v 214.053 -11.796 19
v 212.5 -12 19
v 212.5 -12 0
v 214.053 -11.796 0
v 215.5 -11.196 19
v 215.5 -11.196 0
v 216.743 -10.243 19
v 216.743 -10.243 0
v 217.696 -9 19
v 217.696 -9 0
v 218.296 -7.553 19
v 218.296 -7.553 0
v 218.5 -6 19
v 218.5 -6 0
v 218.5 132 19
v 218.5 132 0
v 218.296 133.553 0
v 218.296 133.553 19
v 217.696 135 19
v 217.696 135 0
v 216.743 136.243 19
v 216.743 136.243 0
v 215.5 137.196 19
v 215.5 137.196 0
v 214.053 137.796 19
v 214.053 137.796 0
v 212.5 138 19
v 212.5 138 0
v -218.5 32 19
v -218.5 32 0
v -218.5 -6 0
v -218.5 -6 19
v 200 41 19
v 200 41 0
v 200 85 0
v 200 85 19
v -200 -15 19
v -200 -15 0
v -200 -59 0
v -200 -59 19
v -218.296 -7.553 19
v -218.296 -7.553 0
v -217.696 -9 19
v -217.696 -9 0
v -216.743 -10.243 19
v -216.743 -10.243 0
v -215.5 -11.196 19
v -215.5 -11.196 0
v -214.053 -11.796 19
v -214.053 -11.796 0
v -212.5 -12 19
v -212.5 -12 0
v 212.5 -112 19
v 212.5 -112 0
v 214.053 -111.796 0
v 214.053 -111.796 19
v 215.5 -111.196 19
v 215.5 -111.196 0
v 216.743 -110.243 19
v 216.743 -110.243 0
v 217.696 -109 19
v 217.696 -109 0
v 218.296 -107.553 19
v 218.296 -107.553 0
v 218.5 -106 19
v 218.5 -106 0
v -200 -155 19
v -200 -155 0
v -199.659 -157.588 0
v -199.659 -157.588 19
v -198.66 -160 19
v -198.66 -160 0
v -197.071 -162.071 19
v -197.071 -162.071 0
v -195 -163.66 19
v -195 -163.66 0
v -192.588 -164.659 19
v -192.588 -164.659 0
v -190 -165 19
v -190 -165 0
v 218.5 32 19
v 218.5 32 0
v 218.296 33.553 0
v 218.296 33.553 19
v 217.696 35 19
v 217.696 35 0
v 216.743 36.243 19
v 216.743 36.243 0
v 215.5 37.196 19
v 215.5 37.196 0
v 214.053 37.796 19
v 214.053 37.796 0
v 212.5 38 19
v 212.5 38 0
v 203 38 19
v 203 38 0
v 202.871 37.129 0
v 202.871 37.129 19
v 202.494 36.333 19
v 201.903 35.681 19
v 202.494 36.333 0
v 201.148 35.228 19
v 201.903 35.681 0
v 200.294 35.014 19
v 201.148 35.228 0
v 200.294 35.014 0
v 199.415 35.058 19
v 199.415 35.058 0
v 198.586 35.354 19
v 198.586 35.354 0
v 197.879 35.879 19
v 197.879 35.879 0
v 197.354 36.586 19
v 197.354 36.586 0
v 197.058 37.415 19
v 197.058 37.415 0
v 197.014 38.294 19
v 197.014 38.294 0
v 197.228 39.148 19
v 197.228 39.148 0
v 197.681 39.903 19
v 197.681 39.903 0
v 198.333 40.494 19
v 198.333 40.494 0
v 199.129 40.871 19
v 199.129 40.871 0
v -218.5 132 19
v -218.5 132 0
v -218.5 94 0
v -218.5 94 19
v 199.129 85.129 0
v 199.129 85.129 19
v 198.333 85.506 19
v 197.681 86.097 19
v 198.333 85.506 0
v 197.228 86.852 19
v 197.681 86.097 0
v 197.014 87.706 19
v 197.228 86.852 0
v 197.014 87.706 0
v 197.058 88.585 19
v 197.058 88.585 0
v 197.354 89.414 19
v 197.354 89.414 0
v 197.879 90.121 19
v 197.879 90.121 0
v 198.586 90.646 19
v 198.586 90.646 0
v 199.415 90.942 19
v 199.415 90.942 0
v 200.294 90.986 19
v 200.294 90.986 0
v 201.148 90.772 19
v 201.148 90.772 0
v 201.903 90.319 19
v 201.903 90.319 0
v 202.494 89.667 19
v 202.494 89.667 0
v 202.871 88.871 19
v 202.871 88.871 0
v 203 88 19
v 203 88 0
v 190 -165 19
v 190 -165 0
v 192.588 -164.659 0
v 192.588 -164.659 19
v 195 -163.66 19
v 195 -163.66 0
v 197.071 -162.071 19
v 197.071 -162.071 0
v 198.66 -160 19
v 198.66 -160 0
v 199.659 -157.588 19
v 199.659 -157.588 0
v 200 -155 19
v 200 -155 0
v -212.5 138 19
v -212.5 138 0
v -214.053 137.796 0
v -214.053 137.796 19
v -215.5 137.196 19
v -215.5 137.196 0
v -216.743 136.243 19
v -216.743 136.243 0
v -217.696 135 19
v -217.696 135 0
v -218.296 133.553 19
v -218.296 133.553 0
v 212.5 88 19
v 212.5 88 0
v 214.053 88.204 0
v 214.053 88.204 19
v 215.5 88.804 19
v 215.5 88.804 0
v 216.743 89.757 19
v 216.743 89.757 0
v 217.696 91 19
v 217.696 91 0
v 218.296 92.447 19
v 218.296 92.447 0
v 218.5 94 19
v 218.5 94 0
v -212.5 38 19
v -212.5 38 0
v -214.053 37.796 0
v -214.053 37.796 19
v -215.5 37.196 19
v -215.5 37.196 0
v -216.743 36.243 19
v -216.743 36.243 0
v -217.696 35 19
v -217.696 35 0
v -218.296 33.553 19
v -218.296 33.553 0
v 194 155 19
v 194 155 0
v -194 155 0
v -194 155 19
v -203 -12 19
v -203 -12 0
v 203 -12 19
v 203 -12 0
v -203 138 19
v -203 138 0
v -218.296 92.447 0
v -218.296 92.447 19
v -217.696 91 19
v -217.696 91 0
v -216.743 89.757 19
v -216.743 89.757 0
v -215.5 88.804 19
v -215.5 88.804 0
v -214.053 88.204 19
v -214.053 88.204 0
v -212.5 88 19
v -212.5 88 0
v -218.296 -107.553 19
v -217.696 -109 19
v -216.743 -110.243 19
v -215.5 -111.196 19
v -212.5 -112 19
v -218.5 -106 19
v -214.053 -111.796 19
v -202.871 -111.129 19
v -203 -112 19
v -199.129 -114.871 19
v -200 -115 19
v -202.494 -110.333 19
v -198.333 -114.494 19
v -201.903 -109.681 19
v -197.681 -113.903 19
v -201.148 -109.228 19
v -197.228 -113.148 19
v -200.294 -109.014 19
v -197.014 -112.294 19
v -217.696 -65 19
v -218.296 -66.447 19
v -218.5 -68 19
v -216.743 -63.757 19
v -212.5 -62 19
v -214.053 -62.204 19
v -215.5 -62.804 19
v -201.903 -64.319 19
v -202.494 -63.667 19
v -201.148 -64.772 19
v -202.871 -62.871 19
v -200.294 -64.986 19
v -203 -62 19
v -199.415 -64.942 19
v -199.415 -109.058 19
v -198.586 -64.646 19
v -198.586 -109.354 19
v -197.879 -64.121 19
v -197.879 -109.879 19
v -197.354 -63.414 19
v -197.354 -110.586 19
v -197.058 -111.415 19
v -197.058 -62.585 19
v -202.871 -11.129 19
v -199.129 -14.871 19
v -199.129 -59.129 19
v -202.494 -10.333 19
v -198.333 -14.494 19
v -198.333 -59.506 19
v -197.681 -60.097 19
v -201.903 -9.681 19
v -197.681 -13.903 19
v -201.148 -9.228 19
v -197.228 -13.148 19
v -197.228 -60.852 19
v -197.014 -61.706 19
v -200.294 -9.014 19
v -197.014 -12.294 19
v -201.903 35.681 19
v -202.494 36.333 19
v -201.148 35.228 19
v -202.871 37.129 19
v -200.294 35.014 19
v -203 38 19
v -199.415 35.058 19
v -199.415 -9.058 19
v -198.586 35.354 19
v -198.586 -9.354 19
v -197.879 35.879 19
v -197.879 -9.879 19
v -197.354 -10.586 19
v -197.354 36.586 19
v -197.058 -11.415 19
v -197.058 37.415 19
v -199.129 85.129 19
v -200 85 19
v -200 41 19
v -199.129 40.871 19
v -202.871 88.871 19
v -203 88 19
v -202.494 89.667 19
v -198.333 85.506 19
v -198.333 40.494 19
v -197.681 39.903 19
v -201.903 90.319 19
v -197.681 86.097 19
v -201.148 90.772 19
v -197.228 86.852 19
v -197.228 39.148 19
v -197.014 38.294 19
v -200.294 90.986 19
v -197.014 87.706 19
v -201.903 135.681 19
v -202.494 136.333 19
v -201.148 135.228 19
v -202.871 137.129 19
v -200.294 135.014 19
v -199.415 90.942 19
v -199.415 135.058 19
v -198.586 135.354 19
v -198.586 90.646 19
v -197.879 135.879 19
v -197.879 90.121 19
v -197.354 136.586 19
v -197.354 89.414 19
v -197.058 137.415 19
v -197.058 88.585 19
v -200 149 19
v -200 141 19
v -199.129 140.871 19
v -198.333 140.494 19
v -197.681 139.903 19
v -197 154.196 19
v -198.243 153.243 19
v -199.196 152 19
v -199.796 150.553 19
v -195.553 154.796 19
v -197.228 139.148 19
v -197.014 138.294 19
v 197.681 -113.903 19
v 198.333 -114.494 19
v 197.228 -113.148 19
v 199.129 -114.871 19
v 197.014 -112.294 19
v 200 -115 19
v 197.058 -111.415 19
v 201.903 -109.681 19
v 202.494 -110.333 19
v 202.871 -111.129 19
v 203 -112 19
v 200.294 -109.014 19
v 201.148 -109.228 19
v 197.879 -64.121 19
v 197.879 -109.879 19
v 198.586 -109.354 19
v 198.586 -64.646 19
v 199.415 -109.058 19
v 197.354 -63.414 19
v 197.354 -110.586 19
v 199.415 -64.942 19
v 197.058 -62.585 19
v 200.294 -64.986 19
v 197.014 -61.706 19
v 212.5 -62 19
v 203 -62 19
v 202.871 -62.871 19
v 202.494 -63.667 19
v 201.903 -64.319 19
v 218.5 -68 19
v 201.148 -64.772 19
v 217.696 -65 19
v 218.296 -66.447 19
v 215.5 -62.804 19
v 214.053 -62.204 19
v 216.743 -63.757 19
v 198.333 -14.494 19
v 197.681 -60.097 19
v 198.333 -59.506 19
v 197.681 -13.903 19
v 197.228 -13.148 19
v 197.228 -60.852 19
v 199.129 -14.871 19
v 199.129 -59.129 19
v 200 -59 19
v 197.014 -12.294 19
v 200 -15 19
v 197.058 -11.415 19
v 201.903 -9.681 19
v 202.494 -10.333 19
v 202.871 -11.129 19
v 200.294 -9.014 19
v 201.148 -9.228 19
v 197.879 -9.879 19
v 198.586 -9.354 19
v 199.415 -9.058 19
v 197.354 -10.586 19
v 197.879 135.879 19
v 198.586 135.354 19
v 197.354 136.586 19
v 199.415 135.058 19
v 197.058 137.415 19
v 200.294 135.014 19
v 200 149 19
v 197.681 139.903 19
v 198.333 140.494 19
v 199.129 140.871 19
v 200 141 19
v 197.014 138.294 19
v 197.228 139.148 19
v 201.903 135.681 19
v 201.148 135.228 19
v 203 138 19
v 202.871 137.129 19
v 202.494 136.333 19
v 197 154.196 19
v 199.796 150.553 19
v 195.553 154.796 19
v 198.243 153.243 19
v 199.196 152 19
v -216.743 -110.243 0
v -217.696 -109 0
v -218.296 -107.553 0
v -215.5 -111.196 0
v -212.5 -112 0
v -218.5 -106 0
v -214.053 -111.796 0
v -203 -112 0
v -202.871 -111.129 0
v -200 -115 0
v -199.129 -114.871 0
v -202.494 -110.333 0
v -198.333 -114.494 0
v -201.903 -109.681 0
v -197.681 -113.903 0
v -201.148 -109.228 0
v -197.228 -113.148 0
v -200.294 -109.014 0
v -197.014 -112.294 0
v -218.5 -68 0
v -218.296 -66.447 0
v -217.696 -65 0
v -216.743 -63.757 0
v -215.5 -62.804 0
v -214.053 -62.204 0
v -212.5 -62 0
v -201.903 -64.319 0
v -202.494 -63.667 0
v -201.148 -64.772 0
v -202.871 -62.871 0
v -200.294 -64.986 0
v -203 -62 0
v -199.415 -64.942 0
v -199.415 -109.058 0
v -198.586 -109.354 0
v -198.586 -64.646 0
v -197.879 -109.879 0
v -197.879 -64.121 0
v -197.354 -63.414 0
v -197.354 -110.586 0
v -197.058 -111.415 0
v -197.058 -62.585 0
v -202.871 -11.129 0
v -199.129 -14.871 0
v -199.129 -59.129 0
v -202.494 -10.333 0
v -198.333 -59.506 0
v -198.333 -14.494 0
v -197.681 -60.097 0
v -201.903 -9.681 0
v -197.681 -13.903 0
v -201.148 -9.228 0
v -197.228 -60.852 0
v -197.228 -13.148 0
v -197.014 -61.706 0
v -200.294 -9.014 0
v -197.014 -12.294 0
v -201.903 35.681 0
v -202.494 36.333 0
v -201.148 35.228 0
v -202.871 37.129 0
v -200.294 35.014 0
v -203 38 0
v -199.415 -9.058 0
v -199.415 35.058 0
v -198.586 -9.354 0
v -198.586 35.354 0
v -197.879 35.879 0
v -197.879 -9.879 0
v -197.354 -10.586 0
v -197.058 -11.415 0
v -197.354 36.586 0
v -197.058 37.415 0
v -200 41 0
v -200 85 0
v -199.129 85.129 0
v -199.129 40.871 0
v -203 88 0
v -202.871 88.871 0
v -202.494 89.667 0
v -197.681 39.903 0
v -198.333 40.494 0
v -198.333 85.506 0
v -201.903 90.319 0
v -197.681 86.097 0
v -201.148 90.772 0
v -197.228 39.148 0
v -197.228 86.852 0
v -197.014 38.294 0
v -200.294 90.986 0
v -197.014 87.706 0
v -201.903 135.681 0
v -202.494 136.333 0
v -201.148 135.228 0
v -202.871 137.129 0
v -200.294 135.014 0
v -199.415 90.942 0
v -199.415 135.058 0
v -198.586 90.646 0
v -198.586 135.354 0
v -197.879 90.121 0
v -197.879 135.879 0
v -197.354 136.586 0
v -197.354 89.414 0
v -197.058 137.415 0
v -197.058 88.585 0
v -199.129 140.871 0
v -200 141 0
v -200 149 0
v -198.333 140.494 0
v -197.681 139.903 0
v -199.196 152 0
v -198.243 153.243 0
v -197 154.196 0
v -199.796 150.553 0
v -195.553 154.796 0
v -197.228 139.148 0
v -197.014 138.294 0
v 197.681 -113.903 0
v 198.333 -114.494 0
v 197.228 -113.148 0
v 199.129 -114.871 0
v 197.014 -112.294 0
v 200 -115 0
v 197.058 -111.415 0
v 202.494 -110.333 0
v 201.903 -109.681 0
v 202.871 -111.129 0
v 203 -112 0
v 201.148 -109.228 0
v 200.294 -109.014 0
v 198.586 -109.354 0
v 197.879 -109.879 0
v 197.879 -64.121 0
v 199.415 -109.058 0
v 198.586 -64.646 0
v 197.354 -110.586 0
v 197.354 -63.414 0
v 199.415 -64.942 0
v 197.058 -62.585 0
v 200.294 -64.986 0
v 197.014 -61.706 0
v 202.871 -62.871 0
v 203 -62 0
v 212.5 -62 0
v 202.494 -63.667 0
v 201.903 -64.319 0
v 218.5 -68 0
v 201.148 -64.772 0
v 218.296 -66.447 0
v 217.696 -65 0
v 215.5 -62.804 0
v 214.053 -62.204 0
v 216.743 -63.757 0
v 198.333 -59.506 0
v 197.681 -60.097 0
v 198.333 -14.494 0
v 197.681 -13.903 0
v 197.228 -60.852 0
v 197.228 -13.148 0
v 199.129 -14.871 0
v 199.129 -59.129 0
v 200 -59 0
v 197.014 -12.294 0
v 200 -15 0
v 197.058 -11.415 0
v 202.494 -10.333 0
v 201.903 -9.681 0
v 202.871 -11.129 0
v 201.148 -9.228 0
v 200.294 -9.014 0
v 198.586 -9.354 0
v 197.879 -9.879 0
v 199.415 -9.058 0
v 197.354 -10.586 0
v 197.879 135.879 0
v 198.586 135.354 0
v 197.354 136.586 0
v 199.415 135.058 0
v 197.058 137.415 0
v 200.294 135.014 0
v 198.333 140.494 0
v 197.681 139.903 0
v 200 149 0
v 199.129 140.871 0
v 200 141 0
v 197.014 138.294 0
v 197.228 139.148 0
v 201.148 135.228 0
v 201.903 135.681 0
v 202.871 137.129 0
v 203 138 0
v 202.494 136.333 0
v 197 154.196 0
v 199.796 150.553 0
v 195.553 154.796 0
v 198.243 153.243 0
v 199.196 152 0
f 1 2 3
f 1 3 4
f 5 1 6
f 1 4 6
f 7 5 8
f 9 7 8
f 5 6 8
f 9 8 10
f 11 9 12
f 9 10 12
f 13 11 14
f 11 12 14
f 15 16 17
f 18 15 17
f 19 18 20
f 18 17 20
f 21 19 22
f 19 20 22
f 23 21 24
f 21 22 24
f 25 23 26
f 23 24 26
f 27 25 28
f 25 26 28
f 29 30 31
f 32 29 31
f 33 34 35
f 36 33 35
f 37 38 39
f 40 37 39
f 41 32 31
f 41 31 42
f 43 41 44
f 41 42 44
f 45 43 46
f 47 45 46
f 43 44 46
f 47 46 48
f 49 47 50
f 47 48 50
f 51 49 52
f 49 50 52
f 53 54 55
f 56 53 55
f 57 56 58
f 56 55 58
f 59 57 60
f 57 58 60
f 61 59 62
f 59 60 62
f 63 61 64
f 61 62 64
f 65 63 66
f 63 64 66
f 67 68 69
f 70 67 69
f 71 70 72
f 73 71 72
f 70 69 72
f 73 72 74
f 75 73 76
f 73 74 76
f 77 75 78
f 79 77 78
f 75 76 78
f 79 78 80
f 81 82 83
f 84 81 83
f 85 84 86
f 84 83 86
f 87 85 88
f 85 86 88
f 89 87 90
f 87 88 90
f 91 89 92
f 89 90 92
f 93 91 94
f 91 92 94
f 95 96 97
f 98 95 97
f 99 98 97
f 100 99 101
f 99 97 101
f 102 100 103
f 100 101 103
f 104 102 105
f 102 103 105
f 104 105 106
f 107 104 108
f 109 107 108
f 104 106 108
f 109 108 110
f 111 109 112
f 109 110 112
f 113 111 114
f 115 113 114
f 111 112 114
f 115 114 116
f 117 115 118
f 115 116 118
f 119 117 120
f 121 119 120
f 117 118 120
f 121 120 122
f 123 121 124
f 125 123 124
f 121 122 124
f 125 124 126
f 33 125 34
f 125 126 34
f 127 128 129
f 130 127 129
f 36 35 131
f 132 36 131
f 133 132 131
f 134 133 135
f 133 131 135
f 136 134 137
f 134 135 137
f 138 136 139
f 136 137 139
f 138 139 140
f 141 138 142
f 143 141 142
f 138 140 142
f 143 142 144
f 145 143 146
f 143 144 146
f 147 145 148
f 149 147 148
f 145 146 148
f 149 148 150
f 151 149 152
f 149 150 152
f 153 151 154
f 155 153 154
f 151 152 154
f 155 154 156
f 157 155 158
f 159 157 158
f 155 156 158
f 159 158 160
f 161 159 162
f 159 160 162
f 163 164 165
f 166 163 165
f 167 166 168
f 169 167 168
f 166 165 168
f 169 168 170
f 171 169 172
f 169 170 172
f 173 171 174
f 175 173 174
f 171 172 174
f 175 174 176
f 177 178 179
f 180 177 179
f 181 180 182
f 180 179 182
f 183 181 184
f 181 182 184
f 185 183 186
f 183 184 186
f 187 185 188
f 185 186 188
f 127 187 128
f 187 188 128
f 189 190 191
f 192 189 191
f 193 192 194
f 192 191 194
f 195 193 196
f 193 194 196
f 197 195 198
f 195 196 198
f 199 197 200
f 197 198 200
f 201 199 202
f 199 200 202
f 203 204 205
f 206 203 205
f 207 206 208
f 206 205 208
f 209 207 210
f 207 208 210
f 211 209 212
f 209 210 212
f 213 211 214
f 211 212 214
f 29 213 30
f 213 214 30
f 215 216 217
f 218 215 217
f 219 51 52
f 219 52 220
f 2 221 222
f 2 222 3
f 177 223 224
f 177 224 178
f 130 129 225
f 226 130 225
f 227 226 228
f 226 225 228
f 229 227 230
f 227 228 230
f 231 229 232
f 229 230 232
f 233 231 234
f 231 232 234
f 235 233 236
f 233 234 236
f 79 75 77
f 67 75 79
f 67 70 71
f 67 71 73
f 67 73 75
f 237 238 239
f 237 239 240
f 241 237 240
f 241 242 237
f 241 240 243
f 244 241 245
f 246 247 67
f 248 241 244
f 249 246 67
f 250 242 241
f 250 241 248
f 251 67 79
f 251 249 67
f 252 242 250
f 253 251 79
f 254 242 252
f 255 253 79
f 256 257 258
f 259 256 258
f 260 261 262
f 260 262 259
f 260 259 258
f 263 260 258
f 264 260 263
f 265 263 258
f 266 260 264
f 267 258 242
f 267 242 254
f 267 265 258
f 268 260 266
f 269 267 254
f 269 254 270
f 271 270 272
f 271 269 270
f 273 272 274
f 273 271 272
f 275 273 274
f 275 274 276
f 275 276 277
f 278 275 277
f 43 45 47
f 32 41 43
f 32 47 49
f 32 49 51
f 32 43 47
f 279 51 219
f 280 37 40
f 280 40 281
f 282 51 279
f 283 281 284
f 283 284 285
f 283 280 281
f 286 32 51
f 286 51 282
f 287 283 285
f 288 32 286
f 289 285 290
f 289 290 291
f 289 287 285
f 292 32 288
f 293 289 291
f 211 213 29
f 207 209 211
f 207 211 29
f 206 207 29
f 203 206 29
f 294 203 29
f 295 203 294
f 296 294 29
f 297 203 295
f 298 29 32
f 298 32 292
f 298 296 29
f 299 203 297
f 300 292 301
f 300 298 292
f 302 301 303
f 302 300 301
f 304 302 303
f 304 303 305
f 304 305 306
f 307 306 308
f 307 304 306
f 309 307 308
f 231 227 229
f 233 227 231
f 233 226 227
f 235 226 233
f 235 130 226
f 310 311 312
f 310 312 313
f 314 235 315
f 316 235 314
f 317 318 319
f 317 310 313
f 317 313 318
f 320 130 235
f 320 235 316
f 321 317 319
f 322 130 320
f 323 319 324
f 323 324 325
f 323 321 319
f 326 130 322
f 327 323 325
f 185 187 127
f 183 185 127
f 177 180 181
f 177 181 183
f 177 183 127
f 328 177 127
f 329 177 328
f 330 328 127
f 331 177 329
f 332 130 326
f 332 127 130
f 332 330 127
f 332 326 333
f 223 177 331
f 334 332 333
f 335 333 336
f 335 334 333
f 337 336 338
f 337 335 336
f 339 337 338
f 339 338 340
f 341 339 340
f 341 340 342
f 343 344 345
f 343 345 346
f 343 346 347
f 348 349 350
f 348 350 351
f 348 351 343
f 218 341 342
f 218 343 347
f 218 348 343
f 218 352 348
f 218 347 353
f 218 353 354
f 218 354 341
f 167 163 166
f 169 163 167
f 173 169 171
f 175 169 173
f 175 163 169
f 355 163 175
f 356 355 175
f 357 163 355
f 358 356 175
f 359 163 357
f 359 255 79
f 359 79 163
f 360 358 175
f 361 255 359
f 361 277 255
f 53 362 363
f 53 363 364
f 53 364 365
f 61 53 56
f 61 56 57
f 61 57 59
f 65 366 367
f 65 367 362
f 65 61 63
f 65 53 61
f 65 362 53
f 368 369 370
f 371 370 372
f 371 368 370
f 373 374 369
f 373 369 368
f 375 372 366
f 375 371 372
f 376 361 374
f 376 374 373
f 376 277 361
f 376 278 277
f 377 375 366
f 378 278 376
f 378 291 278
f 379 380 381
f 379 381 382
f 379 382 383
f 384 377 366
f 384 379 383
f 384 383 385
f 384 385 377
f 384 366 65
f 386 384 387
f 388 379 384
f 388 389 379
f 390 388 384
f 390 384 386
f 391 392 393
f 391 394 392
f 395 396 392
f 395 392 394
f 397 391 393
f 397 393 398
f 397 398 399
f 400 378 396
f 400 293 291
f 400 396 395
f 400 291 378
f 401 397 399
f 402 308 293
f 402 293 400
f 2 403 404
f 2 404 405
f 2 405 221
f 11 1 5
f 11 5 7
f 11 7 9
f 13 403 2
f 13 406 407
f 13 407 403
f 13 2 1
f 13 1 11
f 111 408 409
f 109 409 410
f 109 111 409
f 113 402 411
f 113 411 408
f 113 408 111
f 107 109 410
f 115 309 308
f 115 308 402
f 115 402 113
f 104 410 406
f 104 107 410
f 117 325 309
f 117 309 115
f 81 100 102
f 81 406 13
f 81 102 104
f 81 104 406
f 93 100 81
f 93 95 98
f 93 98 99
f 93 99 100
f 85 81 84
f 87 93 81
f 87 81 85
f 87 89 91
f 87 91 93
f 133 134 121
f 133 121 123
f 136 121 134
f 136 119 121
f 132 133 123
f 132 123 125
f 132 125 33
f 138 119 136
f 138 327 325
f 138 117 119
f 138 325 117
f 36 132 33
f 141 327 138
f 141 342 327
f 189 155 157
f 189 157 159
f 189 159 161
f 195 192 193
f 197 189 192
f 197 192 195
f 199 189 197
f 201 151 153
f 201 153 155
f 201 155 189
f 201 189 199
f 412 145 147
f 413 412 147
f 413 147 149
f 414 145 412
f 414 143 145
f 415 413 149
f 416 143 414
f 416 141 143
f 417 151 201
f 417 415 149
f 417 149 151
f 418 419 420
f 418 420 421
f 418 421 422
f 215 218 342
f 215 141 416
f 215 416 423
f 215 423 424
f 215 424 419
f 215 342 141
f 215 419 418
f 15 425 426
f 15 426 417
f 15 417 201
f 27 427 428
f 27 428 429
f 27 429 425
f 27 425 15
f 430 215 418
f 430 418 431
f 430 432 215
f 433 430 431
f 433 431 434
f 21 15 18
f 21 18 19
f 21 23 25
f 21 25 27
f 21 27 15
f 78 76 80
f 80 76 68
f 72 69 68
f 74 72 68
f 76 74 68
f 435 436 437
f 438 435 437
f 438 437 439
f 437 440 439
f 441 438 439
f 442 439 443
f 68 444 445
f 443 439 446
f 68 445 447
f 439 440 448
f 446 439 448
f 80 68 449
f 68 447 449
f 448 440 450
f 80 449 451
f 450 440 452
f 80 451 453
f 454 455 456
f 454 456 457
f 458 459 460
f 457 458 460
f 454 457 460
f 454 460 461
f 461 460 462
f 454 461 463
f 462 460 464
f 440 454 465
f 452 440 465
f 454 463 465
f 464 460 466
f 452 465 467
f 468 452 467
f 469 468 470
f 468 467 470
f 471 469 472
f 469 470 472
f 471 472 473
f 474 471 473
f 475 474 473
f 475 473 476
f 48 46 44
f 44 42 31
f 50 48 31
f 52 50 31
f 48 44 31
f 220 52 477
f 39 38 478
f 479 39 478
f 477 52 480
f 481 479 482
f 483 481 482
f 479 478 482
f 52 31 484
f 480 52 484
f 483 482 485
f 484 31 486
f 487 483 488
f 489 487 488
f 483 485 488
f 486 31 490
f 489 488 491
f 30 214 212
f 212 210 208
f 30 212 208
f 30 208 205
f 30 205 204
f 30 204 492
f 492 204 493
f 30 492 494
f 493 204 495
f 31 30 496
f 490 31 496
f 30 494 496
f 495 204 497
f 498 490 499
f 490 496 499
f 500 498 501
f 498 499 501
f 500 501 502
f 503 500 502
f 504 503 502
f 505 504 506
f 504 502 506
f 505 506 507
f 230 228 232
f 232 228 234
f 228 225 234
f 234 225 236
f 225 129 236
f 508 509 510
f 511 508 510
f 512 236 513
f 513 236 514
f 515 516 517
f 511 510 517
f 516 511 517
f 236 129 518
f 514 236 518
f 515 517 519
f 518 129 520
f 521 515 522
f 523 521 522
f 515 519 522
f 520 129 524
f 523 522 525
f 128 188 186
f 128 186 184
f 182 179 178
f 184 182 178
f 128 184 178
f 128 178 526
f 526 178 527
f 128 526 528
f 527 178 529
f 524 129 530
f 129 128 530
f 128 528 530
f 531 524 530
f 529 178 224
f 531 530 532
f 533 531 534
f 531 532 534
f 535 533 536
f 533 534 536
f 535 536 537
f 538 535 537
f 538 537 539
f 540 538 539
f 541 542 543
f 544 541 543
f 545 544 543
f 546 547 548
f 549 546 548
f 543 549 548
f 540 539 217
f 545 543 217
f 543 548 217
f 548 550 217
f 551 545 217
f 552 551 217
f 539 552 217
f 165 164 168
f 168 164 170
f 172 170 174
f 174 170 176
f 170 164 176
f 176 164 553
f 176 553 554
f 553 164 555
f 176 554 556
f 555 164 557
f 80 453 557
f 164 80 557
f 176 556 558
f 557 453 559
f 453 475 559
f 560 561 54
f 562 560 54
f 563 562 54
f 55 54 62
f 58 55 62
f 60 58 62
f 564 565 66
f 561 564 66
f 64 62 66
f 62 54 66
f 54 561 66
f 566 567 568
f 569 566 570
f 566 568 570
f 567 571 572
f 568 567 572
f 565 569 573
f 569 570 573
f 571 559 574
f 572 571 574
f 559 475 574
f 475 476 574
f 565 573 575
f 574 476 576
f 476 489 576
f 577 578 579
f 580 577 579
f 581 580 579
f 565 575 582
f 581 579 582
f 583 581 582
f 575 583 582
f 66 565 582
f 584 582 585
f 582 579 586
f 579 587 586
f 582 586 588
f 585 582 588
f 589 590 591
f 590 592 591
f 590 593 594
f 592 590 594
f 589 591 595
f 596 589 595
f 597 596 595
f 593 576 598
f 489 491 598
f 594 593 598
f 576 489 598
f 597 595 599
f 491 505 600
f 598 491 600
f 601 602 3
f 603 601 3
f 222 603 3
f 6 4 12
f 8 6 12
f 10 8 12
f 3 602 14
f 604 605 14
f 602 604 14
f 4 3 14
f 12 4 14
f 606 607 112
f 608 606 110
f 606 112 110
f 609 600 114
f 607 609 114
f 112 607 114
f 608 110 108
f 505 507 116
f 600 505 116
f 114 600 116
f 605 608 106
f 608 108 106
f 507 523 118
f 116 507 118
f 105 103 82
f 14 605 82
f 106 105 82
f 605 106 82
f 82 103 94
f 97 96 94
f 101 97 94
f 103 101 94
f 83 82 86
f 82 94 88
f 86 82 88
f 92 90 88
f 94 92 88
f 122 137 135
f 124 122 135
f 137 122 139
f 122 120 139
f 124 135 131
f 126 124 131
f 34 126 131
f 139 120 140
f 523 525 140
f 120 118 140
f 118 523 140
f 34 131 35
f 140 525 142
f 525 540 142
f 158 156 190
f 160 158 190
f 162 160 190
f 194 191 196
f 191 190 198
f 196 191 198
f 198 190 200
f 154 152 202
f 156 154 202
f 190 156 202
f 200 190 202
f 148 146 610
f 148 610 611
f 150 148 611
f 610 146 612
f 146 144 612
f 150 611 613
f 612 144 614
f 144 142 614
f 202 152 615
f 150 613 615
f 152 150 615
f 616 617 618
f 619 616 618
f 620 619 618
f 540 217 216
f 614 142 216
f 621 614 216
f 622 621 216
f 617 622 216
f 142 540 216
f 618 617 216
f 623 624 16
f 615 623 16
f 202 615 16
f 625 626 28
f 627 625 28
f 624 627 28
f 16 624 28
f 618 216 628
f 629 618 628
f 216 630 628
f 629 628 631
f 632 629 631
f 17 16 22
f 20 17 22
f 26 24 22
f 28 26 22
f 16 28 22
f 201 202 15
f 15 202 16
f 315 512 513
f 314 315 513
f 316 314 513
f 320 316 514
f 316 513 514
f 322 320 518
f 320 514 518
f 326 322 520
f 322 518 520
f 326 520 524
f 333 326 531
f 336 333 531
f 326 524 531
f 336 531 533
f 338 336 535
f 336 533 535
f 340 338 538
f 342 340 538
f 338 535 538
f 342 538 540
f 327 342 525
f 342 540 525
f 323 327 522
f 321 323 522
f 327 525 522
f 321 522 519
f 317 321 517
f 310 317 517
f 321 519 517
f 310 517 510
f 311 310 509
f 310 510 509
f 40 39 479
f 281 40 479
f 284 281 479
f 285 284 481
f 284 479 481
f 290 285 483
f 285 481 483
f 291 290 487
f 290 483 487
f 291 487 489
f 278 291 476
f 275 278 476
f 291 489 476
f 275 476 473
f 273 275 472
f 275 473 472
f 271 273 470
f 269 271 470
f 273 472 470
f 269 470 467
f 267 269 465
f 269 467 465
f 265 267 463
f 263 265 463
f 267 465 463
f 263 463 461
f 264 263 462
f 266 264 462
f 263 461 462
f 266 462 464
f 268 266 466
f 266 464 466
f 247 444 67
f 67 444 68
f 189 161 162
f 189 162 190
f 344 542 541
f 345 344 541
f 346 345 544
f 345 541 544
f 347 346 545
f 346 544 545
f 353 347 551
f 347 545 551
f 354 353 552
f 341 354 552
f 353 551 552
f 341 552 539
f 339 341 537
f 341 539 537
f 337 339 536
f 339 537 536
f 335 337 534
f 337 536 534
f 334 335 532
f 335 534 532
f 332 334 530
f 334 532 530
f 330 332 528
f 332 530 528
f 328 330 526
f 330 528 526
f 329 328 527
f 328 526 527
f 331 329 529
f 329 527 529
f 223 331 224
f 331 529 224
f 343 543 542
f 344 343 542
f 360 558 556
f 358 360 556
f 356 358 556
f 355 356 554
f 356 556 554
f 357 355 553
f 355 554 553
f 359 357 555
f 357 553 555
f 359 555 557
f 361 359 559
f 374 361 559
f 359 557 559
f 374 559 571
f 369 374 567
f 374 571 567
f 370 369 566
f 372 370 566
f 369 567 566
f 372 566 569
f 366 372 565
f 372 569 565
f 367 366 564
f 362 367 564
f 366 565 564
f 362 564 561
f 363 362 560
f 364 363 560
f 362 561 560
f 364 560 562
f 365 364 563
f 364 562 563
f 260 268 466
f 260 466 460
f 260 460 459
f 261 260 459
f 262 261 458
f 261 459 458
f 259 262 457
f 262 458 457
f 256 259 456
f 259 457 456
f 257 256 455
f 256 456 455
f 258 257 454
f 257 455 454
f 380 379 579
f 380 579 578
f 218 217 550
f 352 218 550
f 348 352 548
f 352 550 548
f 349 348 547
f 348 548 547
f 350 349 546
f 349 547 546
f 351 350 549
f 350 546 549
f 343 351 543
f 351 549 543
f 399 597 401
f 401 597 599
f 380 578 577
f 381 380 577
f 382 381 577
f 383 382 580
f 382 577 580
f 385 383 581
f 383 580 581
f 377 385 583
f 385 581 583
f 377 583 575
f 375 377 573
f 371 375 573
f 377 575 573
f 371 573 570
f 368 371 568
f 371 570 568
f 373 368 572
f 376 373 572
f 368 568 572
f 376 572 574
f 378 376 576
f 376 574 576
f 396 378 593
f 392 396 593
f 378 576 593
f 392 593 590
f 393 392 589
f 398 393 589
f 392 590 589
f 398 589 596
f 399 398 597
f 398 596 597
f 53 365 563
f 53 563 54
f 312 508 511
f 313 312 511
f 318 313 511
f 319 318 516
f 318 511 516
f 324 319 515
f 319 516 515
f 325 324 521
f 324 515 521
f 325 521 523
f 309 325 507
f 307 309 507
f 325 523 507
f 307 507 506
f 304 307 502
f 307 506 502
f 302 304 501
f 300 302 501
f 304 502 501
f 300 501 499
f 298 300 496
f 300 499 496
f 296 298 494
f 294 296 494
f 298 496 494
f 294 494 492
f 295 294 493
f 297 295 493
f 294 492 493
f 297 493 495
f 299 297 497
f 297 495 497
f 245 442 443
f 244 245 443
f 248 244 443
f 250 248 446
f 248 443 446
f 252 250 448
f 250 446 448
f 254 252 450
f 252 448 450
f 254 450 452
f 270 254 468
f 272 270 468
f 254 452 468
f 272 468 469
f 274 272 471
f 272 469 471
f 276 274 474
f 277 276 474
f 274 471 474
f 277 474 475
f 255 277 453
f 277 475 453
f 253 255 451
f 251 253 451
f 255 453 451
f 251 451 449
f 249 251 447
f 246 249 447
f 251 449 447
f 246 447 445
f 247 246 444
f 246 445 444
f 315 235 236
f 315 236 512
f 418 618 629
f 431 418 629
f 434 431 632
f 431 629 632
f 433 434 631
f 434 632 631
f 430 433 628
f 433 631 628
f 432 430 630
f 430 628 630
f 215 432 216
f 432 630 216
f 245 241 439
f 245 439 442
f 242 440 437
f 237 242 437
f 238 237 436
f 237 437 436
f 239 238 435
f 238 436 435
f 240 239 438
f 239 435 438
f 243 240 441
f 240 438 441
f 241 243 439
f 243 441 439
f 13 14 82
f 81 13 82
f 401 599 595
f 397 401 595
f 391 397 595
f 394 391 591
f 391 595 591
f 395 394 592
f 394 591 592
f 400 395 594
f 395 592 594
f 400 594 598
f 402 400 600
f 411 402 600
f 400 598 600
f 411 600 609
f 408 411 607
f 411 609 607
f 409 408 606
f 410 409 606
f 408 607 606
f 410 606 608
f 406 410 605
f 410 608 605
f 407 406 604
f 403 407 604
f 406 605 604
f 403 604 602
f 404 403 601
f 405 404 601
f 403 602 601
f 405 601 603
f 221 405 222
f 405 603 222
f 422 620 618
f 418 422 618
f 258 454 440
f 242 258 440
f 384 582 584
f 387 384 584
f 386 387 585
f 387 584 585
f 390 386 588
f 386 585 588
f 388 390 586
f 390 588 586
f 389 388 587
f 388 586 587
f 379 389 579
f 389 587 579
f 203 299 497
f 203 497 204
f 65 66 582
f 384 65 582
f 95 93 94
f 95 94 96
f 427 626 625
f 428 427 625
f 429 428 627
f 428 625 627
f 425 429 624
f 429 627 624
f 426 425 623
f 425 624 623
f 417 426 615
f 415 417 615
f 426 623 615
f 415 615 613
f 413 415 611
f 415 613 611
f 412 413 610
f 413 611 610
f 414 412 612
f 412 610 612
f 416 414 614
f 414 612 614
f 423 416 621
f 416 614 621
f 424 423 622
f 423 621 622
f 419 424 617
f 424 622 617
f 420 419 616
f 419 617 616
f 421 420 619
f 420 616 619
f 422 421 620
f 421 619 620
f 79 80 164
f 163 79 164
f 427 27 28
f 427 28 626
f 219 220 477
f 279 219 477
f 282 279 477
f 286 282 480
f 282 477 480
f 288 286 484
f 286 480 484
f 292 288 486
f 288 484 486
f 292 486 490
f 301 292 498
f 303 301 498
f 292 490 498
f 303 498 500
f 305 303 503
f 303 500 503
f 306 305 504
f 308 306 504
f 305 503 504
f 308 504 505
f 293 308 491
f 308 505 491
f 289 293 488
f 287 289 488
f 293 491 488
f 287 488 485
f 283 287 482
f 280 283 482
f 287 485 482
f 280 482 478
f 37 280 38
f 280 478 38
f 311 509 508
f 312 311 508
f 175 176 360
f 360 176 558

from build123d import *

# Parameters (mm, degrees)
BOSS_EXTRUDE1_DEPTH = 19


with BuildPart() as part:
    # Sketch1 → Boss-Extrude1 (new body)
    with BuildSketch(Plane.XY):
        with BuildLine():
            Line((-203, 38), (-212.5, 38))
            ThreePointArc((-212.5, 38), (-216.742640687, 36.242640687), (-218.5, 32))
            Line((-218.5, 32), (-218.5, -6))
            ThreePointArc((-218.5, -6), (-216.742640687, -10.242640687), (-212.5, -12))
            Line((-212.5, -12), (-203, -12))
            ThreePointArc((-203, -12), (-197.878679656, -9.878679656), (-200, -15))
            Line((-200, -15), (-200, -59))
            ThreePointArc((-200, -59), (-197.878679656, -64.121320344), (-203, -62))
            Line((-203, -62), (-212.5, -62))
            ThreePointArc((-212.5, -62), (-216.742640687, -63.757359313), (-218.5, -68))
            Line((-218.5, -68), (-218.5, -106))
            ThreePointArc((-218.5, -106), (-216.742640687, -110.242640687), (-212.5, -112))
            Line((-212.5, -112), (-203, -112))
            ThreePointArc((-203, -112), (-197.878679656, -109.878679656), (-200, -115))
            Line((-200, -115), (-200, -155))
            ThreePointArc((-200, -155), (-197.071067812, -162.071067812), (-190, -165))
            Line((-190, -165), (190, -165))
            ThreePointArc((190, -165), (197.071067812, -162.071067812), (200, -155))
            Line((200, -155), (200, -115))
            ThreePointArc((200, -115), (197.878679656, -109.878679656), (203, -112))
            Line((203, -112), (212.5, -112))
            ThreePointArc((212.5, -112), (216.742640687, -110.242640687), (218.5, -106))
            Line((218.5, -106), (218.5, -68))
            ThreePointArc((218.5, -68), (216.742640687, -63.757359313), (212.5, -62))
            Line((212.5, -62), (203, -62))
            ThreePointArc((203, -62), (197.878679656, -64.121320344), (200, -59))
            Line((200, -59), (200, -15))
            ThreePointArc((200, -15), (197.878679656, -9.878679656), (203, -12))
            Line((203, -12), (212.5, -12))
            ThreePointArc((212.5, -12), (216.742640687, -10.242640687), (218.5, -6))
            Line((218.5, -6), (218.5, 32))
            ThreePointArc((218.5, 32), (216.742640687, 36.242640687), (212.5, 38))
            Line((212.5, 38), (203, 38))
            ThreePointArc((203, 38), (197.878679656, 35.878679656), (200, 41))
            Line((200, 41), (200, 85))
            ThreePointArc((200, 85), (197.878679656, 90.121320344), (203, 88))
            Line((203, 88), (212.5, 88))
            ThreePointArc((212.5, 88), (216.742640687, 89.757359313), (218.5, 94))
            Line((218.5, 94), (218.5, 132))
            ThreePointArc((218.5, 132), (216.742640687, 136.242640687), (212.5, 138))
            Line((212.5, 138), (203, 138))
            ThreePointArc((203, 138), (197.878679656, 135.878679656), (200, 141))
            Line((200, 141), (200, 149))
            ThreePointArc((200, 149), (198.242640687, 153.242640687), (194, 155))
            Line((194, 155), (-194, 155))
            ThreePointArc((-194, 155), (-198.242640687, 153.242640687), (-200, 149))
            Line((-200, 149), (-200, 141))
            ThreePointArc((-200, 141), (-197.878679656, 135.878679656), (-203, 138))
            Line((-203, 138), (-212.5, 138))
            ThreePointArc((-212.5, 138), (-216.742640687, 136.242640687), (-218.5, 132))
            Line((-218.5, 132), (-218.5, 94))
            ThreePointArc((-218.5, 94), (-216.742640687, 89.757359313), (-212.5, 88))
            Line((-212.5, 88), (-203, 88))
            ThreePointArc((-203, 88), (-197.878679656, 90.121320344), (-200, 85))
            Line((-200, 85), (-200, 41))
            ThreePointArc((-200, 41), (-197.878679656, 35.878679656), (-203, 38))
        make_face()
    extrude(amount=BOSS_EXTRUDE1_DEPTH)


solid = part.part
